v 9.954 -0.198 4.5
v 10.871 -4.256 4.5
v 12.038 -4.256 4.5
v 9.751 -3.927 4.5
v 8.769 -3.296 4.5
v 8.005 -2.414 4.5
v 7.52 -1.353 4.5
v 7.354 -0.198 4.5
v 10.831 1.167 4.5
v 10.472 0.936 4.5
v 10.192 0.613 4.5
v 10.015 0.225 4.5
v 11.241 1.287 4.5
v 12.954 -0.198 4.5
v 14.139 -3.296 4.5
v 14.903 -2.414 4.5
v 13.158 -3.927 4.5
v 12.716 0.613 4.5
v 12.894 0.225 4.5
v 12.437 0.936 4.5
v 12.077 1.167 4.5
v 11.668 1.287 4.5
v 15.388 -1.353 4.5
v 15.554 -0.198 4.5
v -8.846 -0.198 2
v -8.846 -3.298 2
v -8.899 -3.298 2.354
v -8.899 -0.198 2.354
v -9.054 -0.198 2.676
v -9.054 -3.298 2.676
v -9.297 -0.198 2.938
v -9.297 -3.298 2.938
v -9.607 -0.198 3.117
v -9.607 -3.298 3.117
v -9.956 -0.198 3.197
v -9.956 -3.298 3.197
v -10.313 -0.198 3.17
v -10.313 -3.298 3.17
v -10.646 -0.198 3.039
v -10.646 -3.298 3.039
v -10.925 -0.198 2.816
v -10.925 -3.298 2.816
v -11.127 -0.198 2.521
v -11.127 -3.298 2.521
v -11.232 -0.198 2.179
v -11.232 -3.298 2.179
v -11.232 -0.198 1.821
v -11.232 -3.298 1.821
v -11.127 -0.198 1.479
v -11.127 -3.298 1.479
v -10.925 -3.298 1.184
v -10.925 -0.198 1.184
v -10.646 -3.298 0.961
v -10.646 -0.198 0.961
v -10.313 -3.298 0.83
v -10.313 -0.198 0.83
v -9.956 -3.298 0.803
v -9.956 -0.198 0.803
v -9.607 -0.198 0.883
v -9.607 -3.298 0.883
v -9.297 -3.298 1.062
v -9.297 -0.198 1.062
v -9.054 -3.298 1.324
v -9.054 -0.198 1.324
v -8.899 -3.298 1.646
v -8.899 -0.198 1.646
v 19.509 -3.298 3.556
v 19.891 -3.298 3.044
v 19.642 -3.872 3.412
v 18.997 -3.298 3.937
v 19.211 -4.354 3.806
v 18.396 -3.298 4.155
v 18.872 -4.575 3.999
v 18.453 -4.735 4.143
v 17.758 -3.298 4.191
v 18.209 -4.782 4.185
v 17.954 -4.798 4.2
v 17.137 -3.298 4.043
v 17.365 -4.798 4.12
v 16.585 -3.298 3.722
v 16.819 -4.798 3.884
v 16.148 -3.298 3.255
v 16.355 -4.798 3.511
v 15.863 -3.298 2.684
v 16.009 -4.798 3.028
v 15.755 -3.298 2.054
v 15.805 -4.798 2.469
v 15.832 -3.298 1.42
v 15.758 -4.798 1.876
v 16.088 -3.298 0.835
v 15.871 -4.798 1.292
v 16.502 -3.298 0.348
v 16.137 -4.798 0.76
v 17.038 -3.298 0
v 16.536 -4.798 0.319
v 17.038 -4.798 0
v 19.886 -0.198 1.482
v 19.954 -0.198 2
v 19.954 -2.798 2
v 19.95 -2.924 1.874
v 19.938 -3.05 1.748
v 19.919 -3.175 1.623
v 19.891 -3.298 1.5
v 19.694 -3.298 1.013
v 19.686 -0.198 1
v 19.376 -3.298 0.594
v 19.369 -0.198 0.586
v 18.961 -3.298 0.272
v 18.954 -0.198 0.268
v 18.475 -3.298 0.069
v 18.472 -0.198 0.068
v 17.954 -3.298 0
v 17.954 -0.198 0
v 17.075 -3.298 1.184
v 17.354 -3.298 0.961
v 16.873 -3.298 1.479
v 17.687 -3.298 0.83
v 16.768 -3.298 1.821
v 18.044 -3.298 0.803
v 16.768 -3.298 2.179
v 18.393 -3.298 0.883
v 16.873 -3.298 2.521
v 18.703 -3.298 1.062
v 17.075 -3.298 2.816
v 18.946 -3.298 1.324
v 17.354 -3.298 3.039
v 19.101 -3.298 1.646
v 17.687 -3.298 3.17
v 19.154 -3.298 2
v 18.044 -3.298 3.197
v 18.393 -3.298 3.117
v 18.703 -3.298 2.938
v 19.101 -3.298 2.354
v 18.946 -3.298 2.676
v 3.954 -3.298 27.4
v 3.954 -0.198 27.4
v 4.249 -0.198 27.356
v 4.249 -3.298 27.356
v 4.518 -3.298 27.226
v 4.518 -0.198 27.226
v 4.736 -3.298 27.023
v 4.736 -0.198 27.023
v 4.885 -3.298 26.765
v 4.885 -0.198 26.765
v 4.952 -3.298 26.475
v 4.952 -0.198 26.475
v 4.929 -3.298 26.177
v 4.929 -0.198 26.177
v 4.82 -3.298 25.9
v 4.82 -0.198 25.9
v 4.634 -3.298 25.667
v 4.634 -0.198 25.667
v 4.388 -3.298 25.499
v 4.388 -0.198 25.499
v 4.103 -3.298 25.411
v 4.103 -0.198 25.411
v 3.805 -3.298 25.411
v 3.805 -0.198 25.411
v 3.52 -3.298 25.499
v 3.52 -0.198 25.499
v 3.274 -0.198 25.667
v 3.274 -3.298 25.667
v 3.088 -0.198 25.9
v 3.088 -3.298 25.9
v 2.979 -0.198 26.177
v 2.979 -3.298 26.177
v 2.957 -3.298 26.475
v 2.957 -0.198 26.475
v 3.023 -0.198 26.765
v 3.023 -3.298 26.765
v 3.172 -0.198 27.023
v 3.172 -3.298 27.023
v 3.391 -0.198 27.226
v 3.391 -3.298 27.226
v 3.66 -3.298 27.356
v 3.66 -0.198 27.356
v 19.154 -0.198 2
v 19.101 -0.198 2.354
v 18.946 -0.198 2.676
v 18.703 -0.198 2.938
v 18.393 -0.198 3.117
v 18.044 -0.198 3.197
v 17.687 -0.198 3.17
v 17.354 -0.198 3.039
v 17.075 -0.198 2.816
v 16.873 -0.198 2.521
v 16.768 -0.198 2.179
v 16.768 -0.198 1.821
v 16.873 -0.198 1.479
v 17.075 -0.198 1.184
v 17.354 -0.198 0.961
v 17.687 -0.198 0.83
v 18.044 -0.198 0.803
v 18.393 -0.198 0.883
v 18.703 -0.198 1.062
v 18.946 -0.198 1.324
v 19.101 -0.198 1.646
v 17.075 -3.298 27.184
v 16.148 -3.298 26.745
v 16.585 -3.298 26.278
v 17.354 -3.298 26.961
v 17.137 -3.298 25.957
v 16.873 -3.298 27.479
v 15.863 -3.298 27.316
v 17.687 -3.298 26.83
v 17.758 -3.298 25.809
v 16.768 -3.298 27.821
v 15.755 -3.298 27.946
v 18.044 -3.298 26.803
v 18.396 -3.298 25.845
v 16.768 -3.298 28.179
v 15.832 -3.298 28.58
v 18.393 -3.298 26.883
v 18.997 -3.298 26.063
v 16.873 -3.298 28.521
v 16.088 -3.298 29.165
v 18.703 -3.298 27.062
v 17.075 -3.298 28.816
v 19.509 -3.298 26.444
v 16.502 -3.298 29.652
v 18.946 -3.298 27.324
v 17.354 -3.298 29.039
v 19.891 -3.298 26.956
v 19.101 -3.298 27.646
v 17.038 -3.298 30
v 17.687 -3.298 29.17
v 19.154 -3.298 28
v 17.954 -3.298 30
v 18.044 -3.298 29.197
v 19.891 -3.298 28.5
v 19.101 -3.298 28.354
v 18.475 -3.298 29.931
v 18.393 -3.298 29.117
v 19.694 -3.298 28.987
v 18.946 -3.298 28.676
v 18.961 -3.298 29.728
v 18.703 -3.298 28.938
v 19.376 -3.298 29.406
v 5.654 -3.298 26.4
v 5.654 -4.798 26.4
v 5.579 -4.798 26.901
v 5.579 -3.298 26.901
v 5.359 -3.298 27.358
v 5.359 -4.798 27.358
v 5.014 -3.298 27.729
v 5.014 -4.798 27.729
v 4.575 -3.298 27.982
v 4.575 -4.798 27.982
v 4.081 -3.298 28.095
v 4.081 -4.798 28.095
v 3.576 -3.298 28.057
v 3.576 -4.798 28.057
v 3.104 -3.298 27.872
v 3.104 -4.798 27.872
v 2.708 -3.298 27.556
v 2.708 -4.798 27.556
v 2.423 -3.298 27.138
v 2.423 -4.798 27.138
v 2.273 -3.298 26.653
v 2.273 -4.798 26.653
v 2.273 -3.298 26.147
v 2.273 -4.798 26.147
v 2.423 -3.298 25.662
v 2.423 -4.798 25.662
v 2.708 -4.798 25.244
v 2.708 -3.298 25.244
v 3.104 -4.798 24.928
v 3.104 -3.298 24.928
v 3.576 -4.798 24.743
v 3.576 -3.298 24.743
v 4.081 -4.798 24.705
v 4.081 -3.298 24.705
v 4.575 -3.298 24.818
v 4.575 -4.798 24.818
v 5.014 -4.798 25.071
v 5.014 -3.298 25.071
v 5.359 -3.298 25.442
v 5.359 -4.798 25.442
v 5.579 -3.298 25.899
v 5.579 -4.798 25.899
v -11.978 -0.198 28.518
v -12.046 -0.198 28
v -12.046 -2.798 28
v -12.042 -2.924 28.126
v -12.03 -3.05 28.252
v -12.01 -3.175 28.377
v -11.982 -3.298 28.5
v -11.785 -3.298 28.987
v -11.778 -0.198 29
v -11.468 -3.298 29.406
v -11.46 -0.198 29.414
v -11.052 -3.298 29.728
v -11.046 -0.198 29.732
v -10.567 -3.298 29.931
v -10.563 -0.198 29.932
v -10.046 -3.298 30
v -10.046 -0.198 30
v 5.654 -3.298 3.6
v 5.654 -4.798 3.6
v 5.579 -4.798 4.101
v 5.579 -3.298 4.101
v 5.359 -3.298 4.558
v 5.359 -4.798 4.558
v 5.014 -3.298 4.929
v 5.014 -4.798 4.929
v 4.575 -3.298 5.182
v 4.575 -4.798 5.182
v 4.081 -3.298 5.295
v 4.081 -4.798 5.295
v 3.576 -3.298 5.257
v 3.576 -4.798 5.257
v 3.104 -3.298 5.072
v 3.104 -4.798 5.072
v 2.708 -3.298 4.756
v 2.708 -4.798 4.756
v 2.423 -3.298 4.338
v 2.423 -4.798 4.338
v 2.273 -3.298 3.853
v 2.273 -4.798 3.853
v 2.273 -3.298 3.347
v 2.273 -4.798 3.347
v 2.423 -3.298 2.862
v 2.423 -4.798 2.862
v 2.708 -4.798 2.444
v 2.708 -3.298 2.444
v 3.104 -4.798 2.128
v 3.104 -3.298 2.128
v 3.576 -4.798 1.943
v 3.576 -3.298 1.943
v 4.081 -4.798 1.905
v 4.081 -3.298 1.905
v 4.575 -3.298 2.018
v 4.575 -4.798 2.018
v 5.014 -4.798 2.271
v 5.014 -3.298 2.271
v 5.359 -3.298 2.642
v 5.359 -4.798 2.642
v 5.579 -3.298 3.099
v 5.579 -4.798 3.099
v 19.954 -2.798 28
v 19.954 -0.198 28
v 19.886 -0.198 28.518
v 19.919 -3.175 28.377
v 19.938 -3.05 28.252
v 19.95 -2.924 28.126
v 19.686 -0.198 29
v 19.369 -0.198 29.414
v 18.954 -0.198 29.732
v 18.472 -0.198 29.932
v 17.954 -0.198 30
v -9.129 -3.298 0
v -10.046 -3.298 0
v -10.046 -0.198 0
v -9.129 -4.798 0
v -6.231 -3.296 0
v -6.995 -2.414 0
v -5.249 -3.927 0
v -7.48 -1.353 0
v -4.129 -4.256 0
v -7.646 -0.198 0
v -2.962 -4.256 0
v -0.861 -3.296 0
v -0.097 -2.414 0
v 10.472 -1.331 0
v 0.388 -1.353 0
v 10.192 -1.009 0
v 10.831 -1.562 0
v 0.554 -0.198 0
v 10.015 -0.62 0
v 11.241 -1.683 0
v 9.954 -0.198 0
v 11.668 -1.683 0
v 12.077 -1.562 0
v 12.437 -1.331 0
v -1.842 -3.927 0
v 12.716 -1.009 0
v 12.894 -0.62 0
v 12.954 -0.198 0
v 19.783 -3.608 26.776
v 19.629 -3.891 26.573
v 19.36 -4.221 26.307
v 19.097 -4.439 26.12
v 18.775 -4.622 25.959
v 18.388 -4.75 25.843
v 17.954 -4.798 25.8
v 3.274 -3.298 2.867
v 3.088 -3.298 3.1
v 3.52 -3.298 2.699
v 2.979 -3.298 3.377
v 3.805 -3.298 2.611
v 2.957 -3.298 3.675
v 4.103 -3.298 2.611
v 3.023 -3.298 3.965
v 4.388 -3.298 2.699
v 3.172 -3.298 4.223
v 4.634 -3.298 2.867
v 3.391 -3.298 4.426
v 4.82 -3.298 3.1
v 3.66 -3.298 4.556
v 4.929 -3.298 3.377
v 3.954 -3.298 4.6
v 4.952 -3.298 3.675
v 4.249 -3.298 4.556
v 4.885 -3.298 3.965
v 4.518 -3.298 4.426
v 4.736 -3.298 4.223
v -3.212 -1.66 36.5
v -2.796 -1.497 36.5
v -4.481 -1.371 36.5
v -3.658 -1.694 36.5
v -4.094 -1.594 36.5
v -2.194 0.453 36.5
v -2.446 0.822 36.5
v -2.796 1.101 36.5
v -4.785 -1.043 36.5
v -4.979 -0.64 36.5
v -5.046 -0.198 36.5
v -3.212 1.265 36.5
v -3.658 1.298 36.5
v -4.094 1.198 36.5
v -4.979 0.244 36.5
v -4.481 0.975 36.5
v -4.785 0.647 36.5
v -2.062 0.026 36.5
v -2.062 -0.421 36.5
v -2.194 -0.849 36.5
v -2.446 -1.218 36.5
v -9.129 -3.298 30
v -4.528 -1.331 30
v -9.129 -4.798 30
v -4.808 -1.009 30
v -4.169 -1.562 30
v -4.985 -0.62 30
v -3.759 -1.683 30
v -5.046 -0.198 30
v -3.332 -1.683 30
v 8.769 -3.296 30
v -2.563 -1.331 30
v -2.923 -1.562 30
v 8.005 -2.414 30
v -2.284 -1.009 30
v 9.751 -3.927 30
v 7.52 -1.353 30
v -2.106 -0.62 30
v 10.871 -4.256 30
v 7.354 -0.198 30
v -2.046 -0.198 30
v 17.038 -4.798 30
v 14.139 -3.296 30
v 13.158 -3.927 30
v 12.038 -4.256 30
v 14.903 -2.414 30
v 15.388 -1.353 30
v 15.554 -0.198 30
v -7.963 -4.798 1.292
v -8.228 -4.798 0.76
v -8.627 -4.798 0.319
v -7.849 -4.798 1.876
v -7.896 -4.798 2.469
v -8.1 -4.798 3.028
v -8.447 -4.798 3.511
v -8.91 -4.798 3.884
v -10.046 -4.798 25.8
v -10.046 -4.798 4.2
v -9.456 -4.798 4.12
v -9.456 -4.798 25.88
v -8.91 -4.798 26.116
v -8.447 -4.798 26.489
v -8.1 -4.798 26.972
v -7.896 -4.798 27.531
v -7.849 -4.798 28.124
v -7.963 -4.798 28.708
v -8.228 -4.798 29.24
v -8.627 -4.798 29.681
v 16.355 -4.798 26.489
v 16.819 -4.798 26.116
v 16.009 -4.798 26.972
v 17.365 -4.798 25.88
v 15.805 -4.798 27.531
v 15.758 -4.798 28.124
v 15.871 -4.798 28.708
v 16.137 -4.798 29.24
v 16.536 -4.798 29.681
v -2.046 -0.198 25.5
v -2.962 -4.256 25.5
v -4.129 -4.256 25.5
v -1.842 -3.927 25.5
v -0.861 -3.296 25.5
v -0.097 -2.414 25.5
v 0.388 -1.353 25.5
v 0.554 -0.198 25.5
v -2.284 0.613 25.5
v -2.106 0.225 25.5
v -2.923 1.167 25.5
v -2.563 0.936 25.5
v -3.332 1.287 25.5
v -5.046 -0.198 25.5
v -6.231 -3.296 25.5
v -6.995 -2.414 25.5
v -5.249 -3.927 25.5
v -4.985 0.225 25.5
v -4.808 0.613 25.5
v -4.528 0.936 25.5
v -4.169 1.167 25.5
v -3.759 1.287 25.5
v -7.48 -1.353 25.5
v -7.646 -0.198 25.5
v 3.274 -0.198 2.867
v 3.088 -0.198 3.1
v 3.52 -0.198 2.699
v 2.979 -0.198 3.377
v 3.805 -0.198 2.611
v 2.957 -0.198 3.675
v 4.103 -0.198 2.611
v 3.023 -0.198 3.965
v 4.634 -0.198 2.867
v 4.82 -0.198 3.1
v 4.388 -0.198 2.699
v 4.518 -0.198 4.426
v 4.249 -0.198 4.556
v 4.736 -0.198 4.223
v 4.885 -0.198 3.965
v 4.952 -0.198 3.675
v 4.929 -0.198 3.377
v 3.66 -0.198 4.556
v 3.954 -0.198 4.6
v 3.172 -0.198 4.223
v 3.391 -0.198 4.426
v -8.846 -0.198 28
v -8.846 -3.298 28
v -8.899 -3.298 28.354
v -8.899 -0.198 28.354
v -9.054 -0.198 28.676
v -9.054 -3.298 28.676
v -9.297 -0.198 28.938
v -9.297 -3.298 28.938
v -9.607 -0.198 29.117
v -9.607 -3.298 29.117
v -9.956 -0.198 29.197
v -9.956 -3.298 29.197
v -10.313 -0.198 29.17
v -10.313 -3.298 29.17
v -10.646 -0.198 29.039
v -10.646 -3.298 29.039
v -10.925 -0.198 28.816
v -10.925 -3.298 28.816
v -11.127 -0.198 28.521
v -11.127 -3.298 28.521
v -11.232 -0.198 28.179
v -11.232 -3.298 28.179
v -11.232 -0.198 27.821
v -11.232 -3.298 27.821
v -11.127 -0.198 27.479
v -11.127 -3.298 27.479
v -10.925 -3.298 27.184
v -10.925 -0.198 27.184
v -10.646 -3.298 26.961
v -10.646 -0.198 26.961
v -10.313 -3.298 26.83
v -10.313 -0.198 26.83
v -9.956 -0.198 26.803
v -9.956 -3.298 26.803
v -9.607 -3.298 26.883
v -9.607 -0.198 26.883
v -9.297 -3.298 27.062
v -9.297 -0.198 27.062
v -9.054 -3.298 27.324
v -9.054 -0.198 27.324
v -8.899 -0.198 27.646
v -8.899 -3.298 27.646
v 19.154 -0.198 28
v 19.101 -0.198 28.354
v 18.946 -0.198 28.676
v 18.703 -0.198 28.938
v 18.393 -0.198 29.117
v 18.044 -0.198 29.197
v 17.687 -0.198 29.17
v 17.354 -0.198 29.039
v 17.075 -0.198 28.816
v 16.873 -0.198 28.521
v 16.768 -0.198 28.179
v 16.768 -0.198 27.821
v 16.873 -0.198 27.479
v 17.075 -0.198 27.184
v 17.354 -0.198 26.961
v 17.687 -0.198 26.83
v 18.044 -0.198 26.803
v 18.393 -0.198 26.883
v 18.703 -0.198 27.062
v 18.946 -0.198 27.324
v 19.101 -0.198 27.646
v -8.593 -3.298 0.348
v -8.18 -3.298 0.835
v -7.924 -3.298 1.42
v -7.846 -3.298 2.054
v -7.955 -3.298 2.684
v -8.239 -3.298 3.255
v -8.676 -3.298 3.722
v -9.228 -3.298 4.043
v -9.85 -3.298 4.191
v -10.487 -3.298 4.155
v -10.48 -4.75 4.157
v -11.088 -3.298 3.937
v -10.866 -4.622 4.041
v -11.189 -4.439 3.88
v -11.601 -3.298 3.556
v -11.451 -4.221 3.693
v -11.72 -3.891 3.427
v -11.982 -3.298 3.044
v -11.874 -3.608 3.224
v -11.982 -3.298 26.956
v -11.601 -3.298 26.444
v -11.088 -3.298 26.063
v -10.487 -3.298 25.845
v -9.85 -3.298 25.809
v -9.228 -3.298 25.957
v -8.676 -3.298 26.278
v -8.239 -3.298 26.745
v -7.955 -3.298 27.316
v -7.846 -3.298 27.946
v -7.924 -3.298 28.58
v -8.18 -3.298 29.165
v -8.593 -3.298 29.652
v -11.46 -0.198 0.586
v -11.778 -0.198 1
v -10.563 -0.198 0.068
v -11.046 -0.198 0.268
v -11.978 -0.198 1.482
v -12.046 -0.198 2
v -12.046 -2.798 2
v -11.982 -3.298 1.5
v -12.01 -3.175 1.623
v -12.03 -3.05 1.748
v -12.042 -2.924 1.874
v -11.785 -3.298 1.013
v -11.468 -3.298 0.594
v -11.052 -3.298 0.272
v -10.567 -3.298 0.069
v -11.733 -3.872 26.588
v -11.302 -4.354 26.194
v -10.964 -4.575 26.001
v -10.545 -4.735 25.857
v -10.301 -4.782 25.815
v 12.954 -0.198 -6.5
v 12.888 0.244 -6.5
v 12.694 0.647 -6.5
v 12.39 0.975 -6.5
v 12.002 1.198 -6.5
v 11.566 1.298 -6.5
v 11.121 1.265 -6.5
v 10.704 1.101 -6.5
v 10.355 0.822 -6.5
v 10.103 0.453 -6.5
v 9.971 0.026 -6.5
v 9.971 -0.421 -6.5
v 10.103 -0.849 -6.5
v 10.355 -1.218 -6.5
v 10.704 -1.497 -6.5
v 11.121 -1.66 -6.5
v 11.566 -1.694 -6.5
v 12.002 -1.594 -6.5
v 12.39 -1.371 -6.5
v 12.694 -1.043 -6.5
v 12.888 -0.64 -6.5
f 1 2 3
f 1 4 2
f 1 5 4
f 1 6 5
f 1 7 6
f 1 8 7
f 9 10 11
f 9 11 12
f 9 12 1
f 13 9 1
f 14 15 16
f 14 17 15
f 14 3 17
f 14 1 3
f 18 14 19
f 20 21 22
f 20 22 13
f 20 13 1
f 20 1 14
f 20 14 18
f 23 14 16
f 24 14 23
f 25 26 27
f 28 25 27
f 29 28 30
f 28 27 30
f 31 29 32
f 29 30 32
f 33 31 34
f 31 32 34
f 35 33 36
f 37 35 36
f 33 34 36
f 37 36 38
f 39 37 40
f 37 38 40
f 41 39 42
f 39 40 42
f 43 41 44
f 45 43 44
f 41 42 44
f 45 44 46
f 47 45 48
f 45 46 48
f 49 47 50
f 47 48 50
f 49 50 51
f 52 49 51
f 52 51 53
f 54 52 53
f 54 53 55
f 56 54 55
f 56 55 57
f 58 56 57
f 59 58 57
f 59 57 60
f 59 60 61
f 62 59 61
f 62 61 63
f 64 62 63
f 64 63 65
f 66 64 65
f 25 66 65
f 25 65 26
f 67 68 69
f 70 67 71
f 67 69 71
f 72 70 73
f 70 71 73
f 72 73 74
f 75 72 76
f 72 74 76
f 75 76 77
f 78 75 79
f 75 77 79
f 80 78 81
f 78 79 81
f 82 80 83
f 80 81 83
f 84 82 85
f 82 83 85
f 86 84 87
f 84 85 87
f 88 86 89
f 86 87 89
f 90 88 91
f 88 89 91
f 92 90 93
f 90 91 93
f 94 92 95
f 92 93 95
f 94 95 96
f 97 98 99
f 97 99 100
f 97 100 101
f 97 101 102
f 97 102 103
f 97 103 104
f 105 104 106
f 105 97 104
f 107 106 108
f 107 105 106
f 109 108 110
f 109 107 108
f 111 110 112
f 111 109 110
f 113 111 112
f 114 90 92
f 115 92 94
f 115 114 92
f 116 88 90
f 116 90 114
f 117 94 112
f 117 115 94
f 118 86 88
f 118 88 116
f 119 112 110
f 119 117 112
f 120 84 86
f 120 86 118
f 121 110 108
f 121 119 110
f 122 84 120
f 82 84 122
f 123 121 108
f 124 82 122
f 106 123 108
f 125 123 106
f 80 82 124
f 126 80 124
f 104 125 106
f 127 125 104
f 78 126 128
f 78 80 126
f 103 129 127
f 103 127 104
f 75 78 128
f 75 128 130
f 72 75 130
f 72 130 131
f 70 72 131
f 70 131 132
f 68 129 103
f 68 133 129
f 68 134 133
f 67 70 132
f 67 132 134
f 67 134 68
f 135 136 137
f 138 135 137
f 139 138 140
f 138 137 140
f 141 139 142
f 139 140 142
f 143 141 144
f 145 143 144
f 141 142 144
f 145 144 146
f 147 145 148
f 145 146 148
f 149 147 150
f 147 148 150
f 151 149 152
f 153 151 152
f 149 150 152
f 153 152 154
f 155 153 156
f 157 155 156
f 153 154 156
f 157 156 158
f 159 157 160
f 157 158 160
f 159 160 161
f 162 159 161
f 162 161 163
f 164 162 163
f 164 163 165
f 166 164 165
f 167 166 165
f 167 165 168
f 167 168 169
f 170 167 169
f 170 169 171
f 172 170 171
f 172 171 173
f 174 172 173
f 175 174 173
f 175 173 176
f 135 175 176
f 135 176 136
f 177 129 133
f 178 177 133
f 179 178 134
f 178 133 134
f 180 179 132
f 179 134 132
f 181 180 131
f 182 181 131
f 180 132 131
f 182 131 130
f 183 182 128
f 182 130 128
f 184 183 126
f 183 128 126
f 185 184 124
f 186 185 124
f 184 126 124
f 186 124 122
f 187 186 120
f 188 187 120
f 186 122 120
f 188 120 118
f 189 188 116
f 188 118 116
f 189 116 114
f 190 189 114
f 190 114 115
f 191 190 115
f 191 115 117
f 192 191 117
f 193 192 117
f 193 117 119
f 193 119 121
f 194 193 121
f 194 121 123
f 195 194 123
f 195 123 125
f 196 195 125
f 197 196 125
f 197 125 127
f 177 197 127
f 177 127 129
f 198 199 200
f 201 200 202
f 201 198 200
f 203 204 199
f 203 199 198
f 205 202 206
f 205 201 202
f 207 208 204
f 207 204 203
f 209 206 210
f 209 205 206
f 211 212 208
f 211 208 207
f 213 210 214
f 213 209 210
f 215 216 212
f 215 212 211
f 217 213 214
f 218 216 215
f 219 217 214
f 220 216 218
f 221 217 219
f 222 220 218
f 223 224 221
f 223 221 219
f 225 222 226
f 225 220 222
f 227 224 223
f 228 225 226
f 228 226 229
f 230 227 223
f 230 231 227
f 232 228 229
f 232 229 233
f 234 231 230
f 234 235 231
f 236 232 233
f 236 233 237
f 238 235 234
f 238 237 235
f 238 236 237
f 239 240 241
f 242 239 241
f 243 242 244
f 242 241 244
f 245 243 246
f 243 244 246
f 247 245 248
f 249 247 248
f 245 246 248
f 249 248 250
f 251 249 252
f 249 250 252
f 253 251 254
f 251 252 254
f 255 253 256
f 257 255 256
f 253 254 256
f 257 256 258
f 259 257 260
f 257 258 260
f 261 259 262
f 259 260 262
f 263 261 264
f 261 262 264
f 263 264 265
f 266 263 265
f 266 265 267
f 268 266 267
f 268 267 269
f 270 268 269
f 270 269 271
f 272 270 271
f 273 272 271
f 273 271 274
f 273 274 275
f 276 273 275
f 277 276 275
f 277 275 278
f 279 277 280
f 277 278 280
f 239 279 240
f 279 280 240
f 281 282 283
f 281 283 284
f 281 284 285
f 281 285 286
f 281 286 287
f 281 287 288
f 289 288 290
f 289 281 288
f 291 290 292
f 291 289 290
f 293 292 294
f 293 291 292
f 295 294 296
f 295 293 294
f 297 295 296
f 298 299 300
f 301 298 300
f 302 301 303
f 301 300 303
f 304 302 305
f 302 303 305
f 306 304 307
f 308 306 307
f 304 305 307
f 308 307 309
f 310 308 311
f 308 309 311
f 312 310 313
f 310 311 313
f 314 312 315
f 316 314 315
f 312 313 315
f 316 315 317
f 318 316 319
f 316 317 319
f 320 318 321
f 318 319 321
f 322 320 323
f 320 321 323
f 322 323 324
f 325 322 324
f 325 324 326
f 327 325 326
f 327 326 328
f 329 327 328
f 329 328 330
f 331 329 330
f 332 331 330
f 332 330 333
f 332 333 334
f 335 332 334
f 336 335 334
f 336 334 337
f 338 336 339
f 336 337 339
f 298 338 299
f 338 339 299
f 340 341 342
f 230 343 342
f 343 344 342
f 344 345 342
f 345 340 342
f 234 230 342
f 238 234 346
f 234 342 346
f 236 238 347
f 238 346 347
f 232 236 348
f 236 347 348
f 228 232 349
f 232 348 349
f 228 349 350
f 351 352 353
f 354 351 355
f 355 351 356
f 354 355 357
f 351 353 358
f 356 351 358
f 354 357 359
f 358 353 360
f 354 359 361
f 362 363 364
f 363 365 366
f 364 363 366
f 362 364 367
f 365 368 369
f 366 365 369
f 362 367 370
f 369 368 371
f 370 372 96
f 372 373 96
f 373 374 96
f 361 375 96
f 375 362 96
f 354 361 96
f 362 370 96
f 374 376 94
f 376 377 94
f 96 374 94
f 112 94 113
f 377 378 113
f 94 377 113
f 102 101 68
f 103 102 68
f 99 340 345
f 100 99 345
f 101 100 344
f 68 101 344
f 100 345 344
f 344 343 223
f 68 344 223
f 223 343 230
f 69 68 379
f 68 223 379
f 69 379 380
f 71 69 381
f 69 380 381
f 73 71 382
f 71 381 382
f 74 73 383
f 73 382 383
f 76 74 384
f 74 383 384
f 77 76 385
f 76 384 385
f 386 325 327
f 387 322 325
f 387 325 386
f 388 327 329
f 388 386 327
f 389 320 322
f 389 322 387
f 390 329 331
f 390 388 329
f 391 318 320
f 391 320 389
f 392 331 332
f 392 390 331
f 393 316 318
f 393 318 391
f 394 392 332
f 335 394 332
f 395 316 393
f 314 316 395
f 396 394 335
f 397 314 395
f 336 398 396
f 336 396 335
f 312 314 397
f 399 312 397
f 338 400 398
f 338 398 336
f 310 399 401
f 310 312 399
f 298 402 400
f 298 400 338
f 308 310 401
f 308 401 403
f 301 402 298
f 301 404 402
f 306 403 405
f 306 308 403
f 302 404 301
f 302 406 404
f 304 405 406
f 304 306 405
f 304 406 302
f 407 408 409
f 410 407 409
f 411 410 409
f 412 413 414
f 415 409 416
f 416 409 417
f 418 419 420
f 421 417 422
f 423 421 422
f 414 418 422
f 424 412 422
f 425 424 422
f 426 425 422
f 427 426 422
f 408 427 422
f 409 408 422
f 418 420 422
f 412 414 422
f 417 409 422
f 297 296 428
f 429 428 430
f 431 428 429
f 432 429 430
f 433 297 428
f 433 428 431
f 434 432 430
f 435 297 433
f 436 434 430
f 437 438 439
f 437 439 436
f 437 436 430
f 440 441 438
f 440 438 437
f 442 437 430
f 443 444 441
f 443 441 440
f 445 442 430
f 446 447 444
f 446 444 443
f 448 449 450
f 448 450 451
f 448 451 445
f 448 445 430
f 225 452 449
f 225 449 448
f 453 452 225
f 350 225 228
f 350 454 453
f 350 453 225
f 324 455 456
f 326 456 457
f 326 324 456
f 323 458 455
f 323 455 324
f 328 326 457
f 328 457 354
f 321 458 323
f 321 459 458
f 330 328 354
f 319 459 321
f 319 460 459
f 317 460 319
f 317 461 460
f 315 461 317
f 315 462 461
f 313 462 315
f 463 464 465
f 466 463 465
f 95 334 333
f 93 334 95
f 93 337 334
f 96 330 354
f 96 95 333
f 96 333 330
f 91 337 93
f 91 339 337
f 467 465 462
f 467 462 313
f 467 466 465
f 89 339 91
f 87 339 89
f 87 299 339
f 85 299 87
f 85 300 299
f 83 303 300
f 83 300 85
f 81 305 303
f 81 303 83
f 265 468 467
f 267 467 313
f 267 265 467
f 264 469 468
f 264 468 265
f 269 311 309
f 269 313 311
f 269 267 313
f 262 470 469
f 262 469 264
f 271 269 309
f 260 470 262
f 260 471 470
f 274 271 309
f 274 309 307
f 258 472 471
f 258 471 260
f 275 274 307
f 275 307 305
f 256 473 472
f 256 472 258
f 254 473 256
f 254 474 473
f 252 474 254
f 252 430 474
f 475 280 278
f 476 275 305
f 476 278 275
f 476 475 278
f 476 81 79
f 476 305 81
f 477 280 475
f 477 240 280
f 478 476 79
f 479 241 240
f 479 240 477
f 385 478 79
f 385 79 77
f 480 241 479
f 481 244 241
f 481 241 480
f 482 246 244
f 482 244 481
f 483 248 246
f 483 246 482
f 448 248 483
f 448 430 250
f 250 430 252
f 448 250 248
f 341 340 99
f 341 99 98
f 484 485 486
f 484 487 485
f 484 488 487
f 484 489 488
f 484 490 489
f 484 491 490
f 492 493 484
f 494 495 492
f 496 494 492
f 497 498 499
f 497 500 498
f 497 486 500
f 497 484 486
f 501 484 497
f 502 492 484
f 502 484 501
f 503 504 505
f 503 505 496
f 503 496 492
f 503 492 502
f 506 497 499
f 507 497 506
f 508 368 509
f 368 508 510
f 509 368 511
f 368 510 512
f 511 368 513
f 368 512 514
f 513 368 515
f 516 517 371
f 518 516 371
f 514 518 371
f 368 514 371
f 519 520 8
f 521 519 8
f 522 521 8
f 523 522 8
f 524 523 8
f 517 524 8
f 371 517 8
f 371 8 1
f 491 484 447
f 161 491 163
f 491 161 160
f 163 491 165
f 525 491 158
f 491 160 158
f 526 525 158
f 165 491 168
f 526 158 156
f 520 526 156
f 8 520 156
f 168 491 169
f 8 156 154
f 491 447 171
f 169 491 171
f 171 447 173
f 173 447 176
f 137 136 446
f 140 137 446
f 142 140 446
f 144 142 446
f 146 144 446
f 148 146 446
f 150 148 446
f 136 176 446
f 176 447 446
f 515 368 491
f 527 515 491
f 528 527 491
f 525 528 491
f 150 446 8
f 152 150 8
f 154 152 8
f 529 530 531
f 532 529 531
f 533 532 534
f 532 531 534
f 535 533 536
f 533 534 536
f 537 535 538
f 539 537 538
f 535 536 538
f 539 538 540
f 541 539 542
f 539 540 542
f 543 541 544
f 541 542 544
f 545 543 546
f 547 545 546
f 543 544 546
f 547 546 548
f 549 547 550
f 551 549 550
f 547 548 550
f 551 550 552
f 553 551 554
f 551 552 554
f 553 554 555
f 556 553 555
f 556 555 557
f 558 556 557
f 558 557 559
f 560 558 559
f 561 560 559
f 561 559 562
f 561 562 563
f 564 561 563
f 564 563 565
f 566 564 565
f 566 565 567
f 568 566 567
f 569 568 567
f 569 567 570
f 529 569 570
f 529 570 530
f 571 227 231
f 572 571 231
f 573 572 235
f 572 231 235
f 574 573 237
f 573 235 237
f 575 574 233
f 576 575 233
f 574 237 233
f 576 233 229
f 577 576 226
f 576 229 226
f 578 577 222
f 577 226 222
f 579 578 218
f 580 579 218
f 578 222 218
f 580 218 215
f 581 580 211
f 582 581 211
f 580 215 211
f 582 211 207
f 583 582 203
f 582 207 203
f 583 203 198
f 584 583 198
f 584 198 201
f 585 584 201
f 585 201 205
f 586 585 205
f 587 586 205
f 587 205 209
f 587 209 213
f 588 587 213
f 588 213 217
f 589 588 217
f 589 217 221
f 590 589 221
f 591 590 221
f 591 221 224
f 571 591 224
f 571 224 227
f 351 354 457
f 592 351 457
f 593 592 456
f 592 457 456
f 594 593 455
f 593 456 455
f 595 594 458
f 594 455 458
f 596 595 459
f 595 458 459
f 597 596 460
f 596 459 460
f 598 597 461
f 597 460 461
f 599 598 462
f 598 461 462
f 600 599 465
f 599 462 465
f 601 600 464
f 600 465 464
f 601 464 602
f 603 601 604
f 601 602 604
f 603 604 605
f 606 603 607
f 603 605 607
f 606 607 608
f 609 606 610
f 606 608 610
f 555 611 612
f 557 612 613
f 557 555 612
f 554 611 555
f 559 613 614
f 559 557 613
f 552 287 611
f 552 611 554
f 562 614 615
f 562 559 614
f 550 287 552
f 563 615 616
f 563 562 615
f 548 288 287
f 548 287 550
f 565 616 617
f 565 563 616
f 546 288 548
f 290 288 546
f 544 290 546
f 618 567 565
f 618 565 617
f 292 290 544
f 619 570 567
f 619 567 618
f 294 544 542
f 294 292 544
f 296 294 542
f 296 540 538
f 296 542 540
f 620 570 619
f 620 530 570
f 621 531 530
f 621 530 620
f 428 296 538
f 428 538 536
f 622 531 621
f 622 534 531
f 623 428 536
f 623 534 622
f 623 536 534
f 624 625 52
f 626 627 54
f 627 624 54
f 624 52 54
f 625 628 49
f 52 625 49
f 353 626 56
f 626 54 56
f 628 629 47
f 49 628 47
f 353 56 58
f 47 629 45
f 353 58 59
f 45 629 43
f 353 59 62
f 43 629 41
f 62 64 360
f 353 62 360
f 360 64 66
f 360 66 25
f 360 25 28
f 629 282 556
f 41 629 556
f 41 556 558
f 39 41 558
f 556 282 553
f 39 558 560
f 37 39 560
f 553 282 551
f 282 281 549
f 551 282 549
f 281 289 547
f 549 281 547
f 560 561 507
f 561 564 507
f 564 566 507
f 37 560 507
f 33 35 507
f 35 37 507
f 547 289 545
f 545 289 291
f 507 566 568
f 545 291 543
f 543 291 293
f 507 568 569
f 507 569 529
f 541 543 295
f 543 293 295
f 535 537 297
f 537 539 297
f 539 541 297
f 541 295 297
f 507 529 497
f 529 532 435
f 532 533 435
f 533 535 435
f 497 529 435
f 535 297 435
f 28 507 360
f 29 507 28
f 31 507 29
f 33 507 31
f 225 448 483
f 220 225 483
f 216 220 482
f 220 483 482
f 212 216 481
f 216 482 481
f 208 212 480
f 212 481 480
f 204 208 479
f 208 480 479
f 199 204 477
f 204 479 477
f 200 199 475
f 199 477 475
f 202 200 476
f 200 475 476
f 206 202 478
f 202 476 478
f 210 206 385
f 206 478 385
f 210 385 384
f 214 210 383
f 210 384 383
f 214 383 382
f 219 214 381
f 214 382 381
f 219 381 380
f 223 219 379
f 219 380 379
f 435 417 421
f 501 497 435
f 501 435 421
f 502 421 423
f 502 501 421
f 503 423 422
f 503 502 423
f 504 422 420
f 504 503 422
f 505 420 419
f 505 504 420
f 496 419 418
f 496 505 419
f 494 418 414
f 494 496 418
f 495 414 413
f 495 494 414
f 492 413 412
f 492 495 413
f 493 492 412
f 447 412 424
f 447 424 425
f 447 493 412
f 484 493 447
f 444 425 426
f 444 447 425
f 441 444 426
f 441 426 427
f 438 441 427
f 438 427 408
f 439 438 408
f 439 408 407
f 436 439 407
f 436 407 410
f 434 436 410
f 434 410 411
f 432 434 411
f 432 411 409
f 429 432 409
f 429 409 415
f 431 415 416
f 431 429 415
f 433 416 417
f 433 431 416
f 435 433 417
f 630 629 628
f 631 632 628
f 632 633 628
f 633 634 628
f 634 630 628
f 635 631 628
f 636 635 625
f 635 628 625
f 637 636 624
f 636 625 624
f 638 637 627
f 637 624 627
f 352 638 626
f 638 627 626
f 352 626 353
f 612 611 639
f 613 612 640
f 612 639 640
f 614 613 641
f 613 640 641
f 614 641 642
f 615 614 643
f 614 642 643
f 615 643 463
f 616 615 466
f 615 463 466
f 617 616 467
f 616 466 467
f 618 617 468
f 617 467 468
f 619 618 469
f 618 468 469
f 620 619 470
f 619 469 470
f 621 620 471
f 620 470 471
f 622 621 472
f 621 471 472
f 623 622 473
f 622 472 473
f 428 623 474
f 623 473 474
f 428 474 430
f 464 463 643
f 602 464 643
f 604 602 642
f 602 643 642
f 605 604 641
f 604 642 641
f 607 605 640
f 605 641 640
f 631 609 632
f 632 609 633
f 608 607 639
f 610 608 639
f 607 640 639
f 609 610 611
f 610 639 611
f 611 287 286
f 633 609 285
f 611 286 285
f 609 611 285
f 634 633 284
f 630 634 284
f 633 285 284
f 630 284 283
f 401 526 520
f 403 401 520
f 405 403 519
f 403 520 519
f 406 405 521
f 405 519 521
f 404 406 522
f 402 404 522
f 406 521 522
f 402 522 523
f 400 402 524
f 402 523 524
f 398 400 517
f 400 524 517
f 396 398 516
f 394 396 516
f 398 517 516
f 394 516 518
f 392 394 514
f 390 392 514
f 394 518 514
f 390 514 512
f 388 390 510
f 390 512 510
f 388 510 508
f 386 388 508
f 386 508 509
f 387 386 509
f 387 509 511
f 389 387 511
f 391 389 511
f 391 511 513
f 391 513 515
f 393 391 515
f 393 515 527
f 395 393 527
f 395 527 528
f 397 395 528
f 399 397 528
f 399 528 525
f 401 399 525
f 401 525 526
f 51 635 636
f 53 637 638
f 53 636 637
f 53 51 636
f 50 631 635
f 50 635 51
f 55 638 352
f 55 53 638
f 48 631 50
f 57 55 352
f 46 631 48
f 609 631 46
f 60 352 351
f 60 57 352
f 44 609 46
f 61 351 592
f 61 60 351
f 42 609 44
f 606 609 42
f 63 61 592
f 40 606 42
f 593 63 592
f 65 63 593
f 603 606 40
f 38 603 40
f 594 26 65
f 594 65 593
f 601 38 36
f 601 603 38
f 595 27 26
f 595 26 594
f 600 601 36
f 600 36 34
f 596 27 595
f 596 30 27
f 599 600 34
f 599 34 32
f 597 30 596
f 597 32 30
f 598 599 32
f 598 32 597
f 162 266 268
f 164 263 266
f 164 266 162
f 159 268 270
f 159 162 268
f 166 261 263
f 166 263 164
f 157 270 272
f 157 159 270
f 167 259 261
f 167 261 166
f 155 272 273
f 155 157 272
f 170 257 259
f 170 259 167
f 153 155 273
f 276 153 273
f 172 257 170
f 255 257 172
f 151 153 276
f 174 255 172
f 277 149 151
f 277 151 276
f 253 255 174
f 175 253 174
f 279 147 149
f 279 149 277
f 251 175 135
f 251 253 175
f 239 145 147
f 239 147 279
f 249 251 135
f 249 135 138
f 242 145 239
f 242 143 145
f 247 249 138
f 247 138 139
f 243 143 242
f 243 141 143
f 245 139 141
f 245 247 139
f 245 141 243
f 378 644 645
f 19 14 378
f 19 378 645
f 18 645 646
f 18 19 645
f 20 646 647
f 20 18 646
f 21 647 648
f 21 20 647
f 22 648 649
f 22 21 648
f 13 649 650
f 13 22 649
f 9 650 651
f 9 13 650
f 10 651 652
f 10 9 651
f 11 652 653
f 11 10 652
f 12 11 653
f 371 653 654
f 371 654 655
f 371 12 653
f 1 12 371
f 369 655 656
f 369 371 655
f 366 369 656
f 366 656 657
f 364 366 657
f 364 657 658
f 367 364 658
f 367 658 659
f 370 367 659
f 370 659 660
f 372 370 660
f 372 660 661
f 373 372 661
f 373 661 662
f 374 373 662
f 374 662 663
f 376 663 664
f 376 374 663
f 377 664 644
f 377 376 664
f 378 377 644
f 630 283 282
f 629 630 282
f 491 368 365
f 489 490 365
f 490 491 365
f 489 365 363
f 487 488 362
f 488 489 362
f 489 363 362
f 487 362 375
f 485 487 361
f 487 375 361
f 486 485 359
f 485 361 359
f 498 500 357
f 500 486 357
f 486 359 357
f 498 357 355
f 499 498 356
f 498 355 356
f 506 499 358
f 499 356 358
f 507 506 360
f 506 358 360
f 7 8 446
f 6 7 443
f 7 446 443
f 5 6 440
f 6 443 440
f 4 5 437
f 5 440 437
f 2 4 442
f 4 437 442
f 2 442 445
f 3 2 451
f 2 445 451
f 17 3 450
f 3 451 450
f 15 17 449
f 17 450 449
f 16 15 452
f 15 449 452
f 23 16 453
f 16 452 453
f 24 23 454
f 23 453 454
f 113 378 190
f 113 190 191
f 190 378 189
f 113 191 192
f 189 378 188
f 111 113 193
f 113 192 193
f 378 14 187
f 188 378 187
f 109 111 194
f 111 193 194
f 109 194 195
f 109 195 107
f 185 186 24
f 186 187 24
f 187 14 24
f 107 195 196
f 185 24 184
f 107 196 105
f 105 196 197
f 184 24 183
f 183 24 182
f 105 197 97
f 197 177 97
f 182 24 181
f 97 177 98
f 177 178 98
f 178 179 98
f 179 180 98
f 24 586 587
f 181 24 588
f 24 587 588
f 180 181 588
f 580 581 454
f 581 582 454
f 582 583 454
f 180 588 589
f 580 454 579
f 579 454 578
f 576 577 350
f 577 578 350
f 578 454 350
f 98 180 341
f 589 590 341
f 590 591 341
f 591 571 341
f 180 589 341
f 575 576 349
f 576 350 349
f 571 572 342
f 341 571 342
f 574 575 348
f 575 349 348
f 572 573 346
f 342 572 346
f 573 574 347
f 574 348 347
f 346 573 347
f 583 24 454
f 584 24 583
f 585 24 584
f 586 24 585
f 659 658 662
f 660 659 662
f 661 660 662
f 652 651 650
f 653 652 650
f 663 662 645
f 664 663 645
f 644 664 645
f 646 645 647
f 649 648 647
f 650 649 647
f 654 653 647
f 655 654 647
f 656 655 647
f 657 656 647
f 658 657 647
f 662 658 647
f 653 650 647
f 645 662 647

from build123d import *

# Parameters (mm, degrees)
SKETCH1_W           = 32
SKETCH1_H           = 6.5
BOSS_EXTRUDE1_DEPTH = 30
FILLET1_R           = 2
SKETCH2_R           = 4.1
CUT_EXTRUDE1_DEPTH  = 25.5
SKETCH3_R           = 4.1
CUT_EXTRUDE2_DEPTH  = 25.5
SKETCH5_W           = 32
SKETCH5_H           = 0.1
CUT_EXTRUDE3_DEPTH  = 37.629308734
SKETCH6_W           = 32
SKETCH6_H           = 1.8
CUT_EXTRUDE4_DEPTH  = 37.629308734
SKETCH7_R           = 2.2
CUT_EXTRUDE5_DEPTH  = 1.5
SKETCH8_R           = 1.2
CUT_EXTRUDE6_DEPTH  = 4
SKETCH9_R           = 1.2
CUT_EXTRUDE7_DEPTH  = 6
SKETCH10_R          = 2.2
CUT_EXTRUDE8_DEPTH  = 1.5
SKETCH11_R          = 1
CUT_EXTRUDE9_DEPTH  = 37.322647437
SKETCH12_R          = 1.7
CUT_EXTRUDE10_DEPTH = 1.5
SKETCH14_R          = 1.5
BOSS_EXTRUDE3_DEPTH = 11
SKETCH15_R          = 1.5
BOSS_EXTRUDE4_DEPTH = 11
FILLET2_R           = 2


with BuildPart() as part:
    # Sketch1 → Boss-Extrude1 (new body)
    with BuildSketch(Plane.XY):
        with Locations((3.954315745, -3.347843701)):
            Rectangle(SKETCH1_W, SKETCH1_H)
    extrude(amount=BOSS_EXTRUDE1_DEPTH)

    # Fillet1
    fillet1_edges = [part.edges().sort_by_distance(p)[0] for p in [
        (19.954315745, -3.347843701, 30),
        (-12.045684255, -3.347843701, 30),
        (19.954315745, -3.347843701, 0),
        (-12.045684255, -3.347843701, 0),
    ]]
    fillet(fillet1_edges, radius=FILLET1_R)

    # Sketch2 → Cut-Extrude1 (cut)
    with BuildSketch(Plane(origin=(0, 0, 0), x_dir=(-1, 0, 0), z_dir=(0, 0, -1))):
        with Locations((3.545684255, -0.197843701)):
            Circle(SKETCH2_R)
    extrude(amount=-CUT_EXTRUDE1_DEPTH, mode=Mode.SUBTRACT)

    # Sketch3 → Cut-Extrude2 (cut)
    with BuildSketch(Plane.XY.offset(30)):
        with Locations((11.454315745, -0.197843701)):
            Circle(SKETCH3_R)
    extrude(amount=-CUT_EXTRUDE2_DEPTH, mode=Mode.SUBTRACT)

    # Sketch5 → Cut-Extrude3 (cut, through all)
    with BuildSketch(Plane.XY.offset(30)):
        with Locations((3.954315745, -0.147843701)):
            Rectangle(SKETCH5_W, SKETCH5_H)
    extrude(amount=-CUT_EXTRUDE3_DEPTH, mode=Mode.SUBTRACT)

    # Sketch6 → Cut-Extrude4 (cut, through all)
    with BuildSketch(Plane.XY.offset(30)):
        with Locations((3.954315745, -5.697843701)):
            Rectangle(SKETCH6_W, SKETCH6_H)
    extrude(amount=-CUT_EXTRUDE4_DEPTH, mode=Mode.SUBTRACT)

    # Sketch7 → Cut-Extrude5 (cut)
    with BuildSketch(Plane.XZ.offset(4.797843701)):
        with Locations((-10.045684255, 2)):
            Circle(SKETCH7_R)
    extrude(amount=-CUT_EXTRUDE5_DEPTH, mode=Mode.SUBTRACT)

    # Sketch8 → Cut-Extrude6 (cut)
    with BuildSketch(Plane.XZ.offset(3.297843701)):
        with Locations((-10.045684255, 2)):
            Circle(SKETCH8_R)
    extrude(amount=-CUT_EXTRUDE6_DEPTH, mode=Mode.SUBTRACT)

    # Sketch9 → Cut-Extrude7 (cut)
    with BuildSketch(Plane.XZ.offset(4.797843701)):
        with Locations((-10.045684255, 28)):
            Circle(SKETCH9_R)
        with Locations((17.954315745, 28)):
            Circle(SKETCH9_R)
        with Locations((17.954315745, 2)):
            Circle(SKETCH9_R)
    extrude(amount=-CUT_EXTRUDE7_DEPTH, mode=Mode.SUBTRACT)

    # Sketch10 → Cut-Extrude8 (cut)
    with BuildSketch(Plane.XZ.offset(4.797843701)):
        with Locations((-10.045684255, 28)):
            Circle(SKETCH10_R)
        with Locations((17.954315745, 28)):
            Circle(SKETCH10_R)
        with Locations((17.954315745, 2)):
            Circle(SKETCH10_R)
    extrude(amount=-CUT_EXTRUDE8_DEPTH, mode=Mode.SUBTRACT)

    # Sketch11 → Cut-Extrude9 (cut, through all)
    with BuildSketch(Plane(origin=(0, -0.197843701, 0), x_dir=(1, 0, 0), z_dir=(0, 1, 0))):
        with Locations(Location((3.954315745, -3.6, 0), (0, 0, 270))):
            Circle(SKETCH11_R)
        with Locations(Location((3.954315745, -26.4, 0), (0, 0, 270))):
            Circle(SKETCH11_R)
    extrude(amount=-CUT_EXTRUDE9_DEPTH, mode=Mode.SUBTRACT)

    # Sketch12 → Cut-Extrude10 (cut)
    with BuildSketch(Plane.XZ.offset(4.797843701)):
        with Locations((3.954315745, 26.4)):
            Circle(SKETCH12_R)
        with Locations((3.954315745, 3.6)):
            Circle(SKETCH12_R)
    extrude(amount=-CUT_EXTRUDE10_DEPTH, mode=Mode.SUBTRACT)

    # Sketch14 → Boss-Extrude3 (add)
    with BuildSketch(Plane.XY.offset(4.5)):
        with Locations((11.454315745, -0.197843701)):
            Circle(SKETCH14_R)
    extrude(amount=-BOSS_EXTRUDE3_DEPTH)

    # Sketch15 → Boss-Extrude4 (add)
    with BuildSketch(Plane(origin=(0, 0, 25.5), x_dir=(-1, 0, 0), z_dir=(0, 0, -1))):
        with Locations((3.545684255, -0.197843701)):
            Circle(SKETCH15_R)
    extrude(amount=-BOSS_EXTRUDE4_DEPTH)

    # Fillet2
    # the kernel refuses this fillet: 2 mm, written as the material it takes off along each edge
    with BuildSketch(Plane(origin=(19.954315745, -4.797843701, 32.083484861), x_dir=(-1, 0, 0), z_dir=(0, 0, -1)), Plane(origin=(-12.045684255, -4.797843701, 32.083484861), x_dir=(0, 1, 0), z_dir=(0, 0, -1))) as fillet2_piece_1:
        with BuildLine():
            CenterArc((FILLET2_R, FILLET2_R), FILLET2_R, 180, 90)
            Line((0, FILLET2_R), (0, 0))
            Line((0, 0), (FILLET2_R, 0))
        make_face()
    extrude(amount=34.166969722, mode=Mode.SUBTRACT)


solid = part.part
